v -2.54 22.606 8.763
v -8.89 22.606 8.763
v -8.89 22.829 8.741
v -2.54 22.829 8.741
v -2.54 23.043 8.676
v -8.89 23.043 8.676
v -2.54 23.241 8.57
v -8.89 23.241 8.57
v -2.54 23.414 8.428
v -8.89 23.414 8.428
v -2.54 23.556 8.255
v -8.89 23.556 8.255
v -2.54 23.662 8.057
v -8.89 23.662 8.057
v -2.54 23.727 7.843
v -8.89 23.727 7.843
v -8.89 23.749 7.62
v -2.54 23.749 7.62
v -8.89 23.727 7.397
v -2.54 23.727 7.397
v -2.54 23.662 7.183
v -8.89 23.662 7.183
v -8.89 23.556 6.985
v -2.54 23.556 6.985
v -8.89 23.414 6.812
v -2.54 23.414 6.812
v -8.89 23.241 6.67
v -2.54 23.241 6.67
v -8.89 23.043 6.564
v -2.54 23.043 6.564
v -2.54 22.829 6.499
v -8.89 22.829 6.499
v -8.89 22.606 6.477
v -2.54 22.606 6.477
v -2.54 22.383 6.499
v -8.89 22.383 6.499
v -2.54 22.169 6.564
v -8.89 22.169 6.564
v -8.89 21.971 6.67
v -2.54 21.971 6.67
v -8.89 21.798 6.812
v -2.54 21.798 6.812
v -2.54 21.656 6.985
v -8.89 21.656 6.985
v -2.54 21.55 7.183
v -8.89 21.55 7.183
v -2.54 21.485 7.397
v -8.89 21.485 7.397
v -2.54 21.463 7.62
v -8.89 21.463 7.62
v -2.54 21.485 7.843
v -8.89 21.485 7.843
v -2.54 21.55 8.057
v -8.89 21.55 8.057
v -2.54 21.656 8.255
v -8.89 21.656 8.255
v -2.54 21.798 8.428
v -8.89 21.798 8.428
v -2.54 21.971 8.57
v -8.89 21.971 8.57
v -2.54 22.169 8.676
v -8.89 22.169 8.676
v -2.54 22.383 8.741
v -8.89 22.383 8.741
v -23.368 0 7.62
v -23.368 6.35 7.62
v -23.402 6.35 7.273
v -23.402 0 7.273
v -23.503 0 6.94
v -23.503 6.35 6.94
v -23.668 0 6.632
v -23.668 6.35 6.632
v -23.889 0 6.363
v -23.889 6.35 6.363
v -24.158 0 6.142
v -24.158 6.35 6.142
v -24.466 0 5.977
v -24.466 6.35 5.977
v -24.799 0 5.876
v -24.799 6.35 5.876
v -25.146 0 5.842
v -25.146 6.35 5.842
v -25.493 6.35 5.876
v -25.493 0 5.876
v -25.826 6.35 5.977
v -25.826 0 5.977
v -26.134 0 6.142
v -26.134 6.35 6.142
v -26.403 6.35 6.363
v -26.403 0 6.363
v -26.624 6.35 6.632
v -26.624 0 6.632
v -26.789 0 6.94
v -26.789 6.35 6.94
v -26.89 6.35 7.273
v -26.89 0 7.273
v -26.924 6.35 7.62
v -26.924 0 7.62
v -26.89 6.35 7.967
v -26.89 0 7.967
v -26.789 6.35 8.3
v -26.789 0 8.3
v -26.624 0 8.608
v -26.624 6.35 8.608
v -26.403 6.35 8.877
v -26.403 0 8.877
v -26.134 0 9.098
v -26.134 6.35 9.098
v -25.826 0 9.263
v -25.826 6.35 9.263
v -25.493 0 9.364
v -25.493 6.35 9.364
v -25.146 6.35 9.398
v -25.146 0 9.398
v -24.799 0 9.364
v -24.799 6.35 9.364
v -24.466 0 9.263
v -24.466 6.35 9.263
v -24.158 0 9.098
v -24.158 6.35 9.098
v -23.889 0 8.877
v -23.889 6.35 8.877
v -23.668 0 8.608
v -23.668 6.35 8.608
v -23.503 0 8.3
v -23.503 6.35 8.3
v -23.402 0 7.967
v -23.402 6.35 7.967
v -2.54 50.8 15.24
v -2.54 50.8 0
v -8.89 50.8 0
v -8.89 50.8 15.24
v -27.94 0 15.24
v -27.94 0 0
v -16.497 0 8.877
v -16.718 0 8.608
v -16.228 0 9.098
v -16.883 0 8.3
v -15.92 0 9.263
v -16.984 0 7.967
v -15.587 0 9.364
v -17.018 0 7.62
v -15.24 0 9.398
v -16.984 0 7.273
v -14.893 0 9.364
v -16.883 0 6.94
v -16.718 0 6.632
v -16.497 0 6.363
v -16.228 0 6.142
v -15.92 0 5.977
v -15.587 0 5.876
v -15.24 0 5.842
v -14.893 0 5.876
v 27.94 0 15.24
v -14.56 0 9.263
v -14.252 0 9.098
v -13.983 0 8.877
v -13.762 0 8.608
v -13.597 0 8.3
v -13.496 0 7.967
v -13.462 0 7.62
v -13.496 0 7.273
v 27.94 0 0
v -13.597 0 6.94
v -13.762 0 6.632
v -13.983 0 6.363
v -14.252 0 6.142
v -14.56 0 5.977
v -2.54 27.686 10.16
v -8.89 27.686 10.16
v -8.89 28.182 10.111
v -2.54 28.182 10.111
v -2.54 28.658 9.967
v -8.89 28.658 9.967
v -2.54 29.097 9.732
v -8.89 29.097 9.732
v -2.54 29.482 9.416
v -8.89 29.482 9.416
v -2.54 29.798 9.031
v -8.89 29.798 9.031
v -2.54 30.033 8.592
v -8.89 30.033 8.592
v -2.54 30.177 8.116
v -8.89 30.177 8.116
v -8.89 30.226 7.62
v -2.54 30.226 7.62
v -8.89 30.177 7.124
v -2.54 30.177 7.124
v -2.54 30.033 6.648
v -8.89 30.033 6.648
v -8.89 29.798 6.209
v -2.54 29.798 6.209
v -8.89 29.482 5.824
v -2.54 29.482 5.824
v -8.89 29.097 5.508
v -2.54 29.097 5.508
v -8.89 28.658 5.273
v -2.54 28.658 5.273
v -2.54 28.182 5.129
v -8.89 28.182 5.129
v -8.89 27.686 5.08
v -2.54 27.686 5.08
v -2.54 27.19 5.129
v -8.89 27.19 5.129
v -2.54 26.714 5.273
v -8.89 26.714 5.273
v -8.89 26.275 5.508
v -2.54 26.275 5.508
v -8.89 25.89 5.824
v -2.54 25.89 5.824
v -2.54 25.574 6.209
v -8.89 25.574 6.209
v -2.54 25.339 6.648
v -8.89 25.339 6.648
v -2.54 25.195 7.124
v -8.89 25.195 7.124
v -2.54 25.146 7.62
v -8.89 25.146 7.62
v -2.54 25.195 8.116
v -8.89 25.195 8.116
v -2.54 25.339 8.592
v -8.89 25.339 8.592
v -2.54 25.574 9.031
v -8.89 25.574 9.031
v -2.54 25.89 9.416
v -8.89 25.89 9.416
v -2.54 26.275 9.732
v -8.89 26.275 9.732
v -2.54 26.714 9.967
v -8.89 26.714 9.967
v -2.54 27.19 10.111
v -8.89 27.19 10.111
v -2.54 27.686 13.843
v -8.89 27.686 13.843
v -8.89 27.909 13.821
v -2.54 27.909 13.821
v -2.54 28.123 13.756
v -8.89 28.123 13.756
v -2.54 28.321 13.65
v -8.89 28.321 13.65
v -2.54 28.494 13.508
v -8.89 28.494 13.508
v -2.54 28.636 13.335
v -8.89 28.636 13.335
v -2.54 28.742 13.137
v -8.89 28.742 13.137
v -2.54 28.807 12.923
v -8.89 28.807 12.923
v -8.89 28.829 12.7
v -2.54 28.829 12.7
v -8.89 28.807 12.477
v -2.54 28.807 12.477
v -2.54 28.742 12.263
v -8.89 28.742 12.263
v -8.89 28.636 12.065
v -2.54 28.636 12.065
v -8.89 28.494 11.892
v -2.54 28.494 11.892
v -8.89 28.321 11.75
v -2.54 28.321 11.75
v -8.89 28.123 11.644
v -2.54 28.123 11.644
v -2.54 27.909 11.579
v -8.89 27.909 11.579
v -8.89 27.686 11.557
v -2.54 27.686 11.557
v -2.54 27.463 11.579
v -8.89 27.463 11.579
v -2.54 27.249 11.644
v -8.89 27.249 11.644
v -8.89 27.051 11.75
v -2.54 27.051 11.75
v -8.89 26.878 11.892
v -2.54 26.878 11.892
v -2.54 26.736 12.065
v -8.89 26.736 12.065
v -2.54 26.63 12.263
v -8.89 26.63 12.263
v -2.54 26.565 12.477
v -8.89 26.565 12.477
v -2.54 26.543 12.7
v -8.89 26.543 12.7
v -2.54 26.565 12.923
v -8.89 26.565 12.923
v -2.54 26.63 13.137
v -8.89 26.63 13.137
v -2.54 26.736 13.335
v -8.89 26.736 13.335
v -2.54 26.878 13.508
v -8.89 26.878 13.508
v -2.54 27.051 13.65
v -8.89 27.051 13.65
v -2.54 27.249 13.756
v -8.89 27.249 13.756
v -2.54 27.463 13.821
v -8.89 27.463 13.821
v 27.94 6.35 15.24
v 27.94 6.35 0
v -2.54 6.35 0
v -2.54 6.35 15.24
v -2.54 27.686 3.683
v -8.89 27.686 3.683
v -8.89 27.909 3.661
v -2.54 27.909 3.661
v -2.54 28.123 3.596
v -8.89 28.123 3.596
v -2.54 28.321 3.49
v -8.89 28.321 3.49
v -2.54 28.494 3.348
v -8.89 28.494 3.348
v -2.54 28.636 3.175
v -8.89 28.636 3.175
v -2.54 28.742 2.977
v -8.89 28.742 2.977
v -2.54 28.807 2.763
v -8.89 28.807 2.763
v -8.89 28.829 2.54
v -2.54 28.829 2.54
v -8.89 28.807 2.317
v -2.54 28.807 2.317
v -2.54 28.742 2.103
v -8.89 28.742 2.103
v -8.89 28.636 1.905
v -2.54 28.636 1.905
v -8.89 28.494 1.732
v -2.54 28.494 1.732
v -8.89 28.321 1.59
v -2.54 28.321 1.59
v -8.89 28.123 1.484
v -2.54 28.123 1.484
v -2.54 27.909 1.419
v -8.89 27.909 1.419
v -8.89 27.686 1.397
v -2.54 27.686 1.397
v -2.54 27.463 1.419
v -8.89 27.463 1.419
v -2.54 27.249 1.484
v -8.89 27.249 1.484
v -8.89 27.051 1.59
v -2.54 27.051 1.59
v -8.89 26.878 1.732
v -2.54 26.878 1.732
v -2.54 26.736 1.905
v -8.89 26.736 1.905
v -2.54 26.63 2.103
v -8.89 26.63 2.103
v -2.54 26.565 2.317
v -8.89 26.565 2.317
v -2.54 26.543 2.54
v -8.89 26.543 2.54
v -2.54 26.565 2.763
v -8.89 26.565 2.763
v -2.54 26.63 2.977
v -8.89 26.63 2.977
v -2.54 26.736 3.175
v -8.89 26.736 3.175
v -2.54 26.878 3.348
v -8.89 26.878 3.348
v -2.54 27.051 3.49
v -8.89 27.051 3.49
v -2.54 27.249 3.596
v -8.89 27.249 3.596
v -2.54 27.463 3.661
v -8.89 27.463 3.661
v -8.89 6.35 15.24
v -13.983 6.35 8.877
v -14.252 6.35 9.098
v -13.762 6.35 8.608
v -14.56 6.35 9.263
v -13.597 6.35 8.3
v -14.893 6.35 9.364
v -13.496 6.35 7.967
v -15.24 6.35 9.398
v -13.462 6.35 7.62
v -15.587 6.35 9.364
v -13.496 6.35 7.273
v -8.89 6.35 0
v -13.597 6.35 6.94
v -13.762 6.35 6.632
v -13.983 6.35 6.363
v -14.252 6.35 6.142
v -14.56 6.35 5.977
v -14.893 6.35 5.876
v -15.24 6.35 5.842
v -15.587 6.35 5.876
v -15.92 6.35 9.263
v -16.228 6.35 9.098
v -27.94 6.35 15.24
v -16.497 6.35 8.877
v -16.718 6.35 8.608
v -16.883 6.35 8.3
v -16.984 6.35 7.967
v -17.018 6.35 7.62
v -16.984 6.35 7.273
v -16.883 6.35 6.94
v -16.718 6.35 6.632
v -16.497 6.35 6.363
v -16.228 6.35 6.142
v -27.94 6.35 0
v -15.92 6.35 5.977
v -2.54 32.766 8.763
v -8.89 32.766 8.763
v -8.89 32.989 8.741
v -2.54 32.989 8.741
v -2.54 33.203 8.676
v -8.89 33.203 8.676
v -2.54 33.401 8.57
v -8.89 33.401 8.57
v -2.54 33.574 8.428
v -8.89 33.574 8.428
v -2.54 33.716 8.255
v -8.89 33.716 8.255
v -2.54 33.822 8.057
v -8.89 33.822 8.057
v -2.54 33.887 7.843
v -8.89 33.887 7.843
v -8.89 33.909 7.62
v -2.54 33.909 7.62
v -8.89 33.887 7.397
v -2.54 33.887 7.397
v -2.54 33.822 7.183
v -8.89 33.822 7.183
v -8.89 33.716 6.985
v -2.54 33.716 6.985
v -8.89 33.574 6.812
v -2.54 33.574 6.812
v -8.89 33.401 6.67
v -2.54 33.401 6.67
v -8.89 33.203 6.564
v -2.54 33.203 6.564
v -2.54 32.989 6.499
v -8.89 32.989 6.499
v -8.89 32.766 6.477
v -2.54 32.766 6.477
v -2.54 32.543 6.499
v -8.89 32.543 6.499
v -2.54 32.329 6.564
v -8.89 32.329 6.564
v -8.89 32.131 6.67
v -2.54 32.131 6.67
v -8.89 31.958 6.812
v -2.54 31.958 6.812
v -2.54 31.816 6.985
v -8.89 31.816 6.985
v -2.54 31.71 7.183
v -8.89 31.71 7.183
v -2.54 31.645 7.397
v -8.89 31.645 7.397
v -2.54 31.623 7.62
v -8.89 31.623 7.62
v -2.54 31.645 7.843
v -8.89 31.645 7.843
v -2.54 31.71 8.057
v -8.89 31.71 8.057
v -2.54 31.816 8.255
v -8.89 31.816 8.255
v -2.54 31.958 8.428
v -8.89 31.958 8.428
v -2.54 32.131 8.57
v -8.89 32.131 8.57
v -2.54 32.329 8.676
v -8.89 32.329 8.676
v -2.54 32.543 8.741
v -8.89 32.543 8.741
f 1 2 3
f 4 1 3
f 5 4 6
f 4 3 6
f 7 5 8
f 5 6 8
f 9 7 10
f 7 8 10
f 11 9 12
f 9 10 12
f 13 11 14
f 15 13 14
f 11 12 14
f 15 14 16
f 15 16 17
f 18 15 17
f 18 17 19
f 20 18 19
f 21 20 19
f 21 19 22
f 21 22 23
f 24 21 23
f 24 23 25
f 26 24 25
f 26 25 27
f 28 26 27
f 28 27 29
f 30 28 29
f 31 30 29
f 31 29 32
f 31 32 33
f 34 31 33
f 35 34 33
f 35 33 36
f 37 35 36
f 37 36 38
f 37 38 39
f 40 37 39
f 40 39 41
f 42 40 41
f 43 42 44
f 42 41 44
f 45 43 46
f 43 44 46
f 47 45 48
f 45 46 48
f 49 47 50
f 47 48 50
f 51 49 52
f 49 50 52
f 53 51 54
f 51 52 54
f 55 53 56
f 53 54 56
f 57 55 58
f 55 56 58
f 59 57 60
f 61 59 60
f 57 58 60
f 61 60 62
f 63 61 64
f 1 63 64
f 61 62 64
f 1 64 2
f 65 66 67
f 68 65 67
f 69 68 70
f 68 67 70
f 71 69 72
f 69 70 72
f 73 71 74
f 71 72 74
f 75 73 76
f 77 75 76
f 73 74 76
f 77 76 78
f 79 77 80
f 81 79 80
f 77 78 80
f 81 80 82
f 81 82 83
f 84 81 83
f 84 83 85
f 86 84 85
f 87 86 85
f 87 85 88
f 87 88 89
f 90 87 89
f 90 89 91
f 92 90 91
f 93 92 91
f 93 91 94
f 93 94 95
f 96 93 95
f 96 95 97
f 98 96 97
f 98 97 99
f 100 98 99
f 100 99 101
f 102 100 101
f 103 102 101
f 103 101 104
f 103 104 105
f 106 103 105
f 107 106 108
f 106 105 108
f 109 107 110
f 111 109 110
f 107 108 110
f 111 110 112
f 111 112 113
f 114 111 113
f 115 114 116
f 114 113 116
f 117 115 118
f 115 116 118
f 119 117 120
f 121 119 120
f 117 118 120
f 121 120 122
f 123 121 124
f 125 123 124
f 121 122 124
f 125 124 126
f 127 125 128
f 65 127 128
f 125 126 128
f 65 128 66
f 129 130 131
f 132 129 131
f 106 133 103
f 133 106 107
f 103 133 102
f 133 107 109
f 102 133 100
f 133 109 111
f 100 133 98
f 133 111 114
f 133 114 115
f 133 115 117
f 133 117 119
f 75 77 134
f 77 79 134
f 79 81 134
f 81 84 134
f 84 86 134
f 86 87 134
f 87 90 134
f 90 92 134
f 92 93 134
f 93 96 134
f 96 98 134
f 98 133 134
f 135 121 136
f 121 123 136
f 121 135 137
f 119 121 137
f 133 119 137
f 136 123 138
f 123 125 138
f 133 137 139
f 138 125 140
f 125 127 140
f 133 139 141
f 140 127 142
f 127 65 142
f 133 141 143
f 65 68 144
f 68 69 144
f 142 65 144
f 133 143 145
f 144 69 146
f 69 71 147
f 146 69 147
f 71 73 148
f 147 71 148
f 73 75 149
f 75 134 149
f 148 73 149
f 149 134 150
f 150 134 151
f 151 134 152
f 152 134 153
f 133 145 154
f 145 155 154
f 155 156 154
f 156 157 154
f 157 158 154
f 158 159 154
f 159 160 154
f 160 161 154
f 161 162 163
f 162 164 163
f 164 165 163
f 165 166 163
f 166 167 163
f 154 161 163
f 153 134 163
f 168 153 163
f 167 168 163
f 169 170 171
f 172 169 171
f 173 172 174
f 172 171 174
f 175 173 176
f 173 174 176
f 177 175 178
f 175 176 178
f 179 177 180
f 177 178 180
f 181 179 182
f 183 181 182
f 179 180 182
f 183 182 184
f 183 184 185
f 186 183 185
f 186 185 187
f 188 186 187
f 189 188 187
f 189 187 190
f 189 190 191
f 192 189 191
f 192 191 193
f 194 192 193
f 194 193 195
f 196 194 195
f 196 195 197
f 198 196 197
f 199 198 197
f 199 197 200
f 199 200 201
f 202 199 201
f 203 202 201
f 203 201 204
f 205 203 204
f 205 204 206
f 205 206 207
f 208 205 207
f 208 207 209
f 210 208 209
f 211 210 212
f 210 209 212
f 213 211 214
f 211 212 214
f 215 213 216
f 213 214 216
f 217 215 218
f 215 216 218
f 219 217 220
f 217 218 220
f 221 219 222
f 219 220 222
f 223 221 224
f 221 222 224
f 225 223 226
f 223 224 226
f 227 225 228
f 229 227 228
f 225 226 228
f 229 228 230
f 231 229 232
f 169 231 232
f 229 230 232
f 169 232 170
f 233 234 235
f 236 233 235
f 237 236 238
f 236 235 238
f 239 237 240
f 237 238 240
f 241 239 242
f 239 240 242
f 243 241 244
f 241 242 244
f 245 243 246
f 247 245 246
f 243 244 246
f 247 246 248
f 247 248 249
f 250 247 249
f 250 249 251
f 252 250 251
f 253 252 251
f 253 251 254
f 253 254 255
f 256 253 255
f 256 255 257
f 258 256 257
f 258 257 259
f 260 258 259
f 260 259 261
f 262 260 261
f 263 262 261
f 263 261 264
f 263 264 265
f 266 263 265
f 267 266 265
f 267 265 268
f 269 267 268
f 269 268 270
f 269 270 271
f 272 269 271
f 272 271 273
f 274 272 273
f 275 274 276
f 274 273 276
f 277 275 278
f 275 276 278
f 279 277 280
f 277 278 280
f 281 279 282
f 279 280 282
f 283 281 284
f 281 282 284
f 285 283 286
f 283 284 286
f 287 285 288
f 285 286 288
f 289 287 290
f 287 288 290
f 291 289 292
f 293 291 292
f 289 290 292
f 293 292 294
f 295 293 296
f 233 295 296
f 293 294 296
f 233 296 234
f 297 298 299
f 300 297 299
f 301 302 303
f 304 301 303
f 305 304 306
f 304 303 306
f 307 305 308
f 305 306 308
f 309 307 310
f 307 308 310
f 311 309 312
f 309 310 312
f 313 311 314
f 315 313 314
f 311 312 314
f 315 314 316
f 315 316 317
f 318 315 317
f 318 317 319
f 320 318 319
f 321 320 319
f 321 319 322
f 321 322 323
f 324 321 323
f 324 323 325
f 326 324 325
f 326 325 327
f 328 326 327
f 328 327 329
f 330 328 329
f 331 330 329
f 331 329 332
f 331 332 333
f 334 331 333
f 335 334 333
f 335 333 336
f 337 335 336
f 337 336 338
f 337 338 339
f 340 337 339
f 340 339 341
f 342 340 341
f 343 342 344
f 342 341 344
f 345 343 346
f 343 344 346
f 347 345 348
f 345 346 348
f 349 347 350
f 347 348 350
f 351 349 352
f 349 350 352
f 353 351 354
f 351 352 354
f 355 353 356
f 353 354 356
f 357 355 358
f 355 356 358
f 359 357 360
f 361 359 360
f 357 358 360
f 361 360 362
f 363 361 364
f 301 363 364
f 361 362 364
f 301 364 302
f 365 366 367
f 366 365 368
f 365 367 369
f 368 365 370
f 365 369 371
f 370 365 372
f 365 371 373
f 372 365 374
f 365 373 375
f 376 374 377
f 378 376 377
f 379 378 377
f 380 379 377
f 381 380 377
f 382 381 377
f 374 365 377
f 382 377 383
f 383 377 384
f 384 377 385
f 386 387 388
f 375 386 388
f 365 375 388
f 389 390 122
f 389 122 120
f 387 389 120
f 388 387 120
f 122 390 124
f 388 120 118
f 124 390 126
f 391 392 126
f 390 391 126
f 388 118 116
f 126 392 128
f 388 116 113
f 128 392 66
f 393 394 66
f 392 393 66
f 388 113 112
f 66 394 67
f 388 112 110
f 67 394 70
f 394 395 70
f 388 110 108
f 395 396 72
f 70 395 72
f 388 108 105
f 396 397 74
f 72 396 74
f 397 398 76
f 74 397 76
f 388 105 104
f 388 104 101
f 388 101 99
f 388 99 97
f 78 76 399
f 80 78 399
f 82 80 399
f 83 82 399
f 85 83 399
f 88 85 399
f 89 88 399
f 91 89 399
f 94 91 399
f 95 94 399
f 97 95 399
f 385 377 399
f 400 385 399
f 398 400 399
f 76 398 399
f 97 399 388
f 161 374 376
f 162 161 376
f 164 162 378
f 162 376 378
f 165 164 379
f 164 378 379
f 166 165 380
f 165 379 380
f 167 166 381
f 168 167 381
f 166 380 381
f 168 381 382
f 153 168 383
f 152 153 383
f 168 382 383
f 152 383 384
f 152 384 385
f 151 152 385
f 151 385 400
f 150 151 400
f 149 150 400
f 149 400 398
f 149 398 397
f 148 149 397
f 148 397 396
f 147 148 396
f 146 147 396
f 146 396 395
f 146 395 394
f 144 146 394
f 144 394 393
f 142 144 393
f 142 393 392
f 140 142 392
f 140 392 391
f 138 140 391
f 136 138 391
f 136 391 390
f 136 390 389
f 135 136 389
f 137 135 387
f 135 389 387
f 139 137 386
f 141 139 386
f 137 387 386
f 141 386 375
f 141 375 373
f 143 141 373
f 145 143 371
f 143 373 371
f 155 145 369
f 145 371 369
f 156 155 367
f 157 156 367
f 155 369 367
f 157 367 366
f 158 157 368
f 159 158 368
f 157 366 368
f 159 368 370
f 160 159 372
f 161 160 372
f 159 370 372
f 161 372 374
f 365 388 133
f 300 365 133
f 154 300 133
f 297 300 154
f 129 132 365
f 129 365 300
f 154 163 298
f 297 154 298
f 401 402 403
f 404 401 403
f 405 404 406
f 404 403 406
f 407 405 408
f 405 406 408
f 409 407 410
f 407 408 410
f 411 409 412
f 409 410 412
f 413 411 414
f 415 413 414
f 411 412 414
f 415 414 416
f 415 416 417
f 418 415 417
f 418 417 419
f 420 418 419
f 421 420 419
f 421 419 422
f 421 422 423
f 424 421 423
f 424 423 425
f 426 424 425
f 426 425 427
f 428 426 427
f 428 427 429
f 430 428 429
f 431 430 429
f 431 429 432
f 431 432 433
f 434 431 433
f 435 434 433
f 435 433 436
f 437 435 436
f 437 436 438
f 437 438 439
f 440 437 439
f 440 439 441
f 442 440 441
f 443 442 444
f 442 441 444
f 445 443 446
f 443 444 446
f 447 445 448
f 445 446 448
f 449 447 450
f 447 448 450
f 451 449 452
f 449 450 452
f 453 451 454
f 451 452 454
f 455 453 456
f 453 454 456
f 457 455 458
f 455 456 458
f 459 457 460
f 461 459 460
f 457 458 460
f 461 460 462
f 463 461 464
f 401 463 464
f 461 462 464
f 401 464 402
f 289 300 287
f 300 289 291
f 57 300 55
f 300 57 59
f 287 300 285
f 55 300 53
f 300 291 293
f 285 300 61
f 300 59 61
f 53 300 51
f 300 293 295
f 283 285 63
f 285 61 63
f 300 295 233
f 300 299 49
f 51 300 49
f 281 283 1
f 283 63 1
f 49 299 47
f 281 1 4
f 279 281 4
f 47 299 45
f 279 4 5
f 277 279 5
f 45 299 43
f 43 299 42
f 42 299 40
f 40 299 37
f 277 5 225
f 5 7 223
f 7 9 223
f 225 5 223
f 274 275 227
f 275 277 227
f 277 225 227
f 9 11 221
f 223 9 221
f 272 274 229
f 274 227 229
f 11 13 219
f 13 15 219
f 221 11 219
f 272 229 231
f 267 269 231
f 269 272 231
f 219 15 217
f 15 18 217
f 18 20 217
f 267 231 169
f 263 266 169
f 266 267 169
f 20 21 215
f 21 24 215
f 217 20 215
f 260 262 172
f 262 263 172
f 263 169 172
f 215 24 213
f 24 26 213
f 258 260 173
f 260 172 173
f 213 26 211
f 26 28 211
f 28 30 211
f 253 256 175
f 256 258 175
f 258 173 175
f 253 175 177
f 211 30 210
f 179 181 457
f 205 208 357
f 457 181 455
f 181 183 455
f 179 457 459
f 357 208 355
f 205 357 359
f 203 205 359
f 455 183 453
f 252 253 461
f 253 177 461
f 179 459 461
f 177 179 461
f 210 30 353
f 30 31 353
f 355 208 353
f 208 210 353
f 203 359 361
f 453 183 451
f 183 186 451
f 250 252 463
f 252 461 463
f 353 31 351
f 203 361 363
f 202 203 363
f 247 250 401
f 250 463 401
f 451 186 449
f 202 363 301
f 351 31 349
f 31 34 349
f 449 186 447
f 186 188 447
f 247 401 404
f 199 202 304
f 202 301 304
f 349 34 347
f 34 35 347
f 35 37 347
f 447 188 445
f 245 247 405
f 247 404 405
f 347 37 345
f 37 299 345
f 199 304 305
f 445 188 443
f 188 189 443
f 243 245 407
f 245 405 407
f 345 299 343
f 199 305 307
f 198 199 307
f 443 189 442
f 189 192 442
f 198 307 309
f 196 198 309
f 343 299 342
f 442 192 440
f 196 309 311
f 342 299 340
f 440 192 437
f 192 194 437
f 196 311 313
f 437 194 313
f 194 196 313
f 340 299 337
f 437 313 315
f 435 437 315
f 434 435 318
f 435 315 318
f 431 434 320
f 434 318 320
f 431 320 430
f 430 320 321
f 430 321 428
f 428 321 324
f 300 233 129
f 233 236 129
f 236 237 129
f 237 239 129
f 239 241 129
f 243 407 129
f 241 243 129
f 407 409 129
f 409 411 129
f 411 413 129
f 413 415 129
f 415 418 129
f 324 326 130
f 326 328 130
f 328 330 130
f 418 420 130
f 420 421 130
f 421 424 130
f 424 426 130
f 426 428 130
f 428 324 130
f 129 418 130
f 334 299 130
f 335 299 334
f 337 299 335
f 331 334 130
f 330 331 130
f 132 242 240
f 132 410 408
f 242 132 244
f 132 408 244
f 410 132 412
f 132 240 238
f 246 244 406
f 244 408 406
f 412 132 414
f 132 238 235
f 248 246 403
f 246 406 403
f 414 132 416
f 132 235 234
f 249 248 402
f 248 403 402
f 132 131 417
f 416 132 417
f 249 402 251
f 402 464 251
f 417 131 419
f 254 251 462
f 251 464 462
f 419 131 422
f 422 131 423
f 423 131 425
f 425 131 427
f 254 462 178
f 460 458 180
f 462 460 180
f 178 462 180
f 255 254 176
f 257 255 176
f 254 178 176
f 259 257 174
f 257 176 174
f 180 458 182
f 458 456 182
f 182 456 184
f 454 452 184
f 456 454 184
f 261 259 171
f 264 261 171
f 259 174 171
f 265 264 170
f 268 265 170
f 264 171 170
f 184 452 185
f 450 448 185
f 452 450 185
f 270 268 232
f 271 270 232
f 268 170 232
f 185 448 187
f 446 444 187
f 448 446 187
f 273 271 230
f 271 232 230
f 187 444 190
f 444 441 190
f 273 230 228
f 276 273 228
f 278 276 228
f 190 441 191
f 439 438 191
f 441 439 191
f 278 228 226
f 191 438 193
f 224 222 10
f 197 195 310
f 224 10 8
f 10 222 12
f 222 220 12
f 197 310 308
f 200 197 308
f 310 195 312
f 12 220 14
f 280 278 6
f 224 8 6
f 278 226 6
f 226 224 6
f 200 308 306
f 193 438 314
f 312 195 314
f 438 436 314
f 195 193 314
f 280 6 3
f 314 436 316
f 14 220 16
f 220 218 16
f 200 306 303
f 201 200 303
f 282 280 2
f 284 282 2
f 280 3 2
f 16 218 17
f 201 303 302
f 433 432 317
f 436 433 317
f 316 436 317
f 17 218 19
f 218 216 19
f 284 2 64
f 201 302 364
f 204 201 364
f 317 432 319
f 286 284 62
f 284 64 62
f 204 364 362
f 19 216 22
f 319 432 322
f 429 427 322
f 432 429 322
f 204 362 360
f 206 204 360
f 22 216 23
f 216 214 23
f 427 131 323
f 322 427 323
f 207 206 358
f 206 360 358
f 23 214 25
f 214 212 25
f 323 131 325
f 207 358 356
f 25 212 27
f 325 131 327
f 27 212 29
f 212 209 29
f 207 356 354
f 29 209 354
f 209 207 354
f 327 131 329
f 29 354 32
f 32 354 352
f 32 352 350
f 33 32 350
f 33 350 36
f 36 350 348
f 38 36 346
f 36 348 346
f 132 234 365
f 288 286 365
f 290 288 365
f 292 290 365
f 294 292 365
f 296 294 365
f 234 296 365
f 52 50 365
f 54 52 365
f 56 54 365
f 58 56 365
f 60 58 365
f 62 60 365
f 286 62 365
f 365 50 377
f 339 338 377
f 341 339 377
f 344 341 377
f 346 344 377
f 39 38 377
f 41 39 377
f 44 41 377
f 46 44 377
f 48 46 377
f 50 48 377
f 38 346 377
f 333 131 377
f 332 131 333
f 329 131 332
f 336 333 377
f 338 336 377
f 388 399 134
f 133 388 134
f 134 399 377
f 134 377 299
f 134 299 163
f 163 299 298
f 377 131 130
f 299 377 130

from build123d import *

# Parameters (mm, degrees)
BOSS_EXTRUDE1_DEPTH = 15.24
SKETCH5_R           = 1.143
SKETCH5_R_2         = 2.54
CUT_EXTRUDE1_DEPTH  = 15.24
SKETCH6_R           = 1.778
CUT_EXTRUDE2_DEPTH  = 15.24


with BuildPart() as part:
    # Sketch2 → Boss-Extrude1 (new body)
    with BuildSketch(Plane.XY):
        Polygon((-27.94, 0), (27.94, 0), (27.94, 6.35), (-2.54, 6.35), (-2.54, 50.8), (-8.89, 50.8), (-8.89, 6.35), (-27.94, 6.35), align=None)
    extrude(amount=BOSS_EXTRUDE1_DEPTH)

    # Sketch5 → Cut-Extrude1 (cut)
    with BuildSketch(Plane.ZY.offset(8.89)):
        with Locations((7.62, 32.766)):
            Circle(SKETCH5_R)
        with Locations((7.62, 27.686)):
            Circle(SKETCH5_R_2)
        with Locations((12.7, 27.686)):
            Circle(SKETCH5_R)
        with Locations((7.62, 22.606)):
            Circle(SKETCH5_R)
        with Locations((2.54, 27.686)):
            Circle(SKETCH5_R)
    extrude(amount=-CUT_EXTRUDE1_DEPTH, mode=Mode.SUBTRACT)

    # Sketch6 → Cut-Extrude2 (cut)
    with BuildSketch(Plane(origin=(0, 6.35, 0), x_dir=(1, 0, 0), z_dir=(0, 1, 0))):
        with Locations((-25.146, -7.62)):
            Circle(SKETCH6_R)
        with Locations((-15.24, -7.62)):
            Circle(SKETCH6_R)
    extrude(amount=-CUT_EXTRUDE2_DEPTH, mode=Mode.SUBTRACT)


solid = part.part
